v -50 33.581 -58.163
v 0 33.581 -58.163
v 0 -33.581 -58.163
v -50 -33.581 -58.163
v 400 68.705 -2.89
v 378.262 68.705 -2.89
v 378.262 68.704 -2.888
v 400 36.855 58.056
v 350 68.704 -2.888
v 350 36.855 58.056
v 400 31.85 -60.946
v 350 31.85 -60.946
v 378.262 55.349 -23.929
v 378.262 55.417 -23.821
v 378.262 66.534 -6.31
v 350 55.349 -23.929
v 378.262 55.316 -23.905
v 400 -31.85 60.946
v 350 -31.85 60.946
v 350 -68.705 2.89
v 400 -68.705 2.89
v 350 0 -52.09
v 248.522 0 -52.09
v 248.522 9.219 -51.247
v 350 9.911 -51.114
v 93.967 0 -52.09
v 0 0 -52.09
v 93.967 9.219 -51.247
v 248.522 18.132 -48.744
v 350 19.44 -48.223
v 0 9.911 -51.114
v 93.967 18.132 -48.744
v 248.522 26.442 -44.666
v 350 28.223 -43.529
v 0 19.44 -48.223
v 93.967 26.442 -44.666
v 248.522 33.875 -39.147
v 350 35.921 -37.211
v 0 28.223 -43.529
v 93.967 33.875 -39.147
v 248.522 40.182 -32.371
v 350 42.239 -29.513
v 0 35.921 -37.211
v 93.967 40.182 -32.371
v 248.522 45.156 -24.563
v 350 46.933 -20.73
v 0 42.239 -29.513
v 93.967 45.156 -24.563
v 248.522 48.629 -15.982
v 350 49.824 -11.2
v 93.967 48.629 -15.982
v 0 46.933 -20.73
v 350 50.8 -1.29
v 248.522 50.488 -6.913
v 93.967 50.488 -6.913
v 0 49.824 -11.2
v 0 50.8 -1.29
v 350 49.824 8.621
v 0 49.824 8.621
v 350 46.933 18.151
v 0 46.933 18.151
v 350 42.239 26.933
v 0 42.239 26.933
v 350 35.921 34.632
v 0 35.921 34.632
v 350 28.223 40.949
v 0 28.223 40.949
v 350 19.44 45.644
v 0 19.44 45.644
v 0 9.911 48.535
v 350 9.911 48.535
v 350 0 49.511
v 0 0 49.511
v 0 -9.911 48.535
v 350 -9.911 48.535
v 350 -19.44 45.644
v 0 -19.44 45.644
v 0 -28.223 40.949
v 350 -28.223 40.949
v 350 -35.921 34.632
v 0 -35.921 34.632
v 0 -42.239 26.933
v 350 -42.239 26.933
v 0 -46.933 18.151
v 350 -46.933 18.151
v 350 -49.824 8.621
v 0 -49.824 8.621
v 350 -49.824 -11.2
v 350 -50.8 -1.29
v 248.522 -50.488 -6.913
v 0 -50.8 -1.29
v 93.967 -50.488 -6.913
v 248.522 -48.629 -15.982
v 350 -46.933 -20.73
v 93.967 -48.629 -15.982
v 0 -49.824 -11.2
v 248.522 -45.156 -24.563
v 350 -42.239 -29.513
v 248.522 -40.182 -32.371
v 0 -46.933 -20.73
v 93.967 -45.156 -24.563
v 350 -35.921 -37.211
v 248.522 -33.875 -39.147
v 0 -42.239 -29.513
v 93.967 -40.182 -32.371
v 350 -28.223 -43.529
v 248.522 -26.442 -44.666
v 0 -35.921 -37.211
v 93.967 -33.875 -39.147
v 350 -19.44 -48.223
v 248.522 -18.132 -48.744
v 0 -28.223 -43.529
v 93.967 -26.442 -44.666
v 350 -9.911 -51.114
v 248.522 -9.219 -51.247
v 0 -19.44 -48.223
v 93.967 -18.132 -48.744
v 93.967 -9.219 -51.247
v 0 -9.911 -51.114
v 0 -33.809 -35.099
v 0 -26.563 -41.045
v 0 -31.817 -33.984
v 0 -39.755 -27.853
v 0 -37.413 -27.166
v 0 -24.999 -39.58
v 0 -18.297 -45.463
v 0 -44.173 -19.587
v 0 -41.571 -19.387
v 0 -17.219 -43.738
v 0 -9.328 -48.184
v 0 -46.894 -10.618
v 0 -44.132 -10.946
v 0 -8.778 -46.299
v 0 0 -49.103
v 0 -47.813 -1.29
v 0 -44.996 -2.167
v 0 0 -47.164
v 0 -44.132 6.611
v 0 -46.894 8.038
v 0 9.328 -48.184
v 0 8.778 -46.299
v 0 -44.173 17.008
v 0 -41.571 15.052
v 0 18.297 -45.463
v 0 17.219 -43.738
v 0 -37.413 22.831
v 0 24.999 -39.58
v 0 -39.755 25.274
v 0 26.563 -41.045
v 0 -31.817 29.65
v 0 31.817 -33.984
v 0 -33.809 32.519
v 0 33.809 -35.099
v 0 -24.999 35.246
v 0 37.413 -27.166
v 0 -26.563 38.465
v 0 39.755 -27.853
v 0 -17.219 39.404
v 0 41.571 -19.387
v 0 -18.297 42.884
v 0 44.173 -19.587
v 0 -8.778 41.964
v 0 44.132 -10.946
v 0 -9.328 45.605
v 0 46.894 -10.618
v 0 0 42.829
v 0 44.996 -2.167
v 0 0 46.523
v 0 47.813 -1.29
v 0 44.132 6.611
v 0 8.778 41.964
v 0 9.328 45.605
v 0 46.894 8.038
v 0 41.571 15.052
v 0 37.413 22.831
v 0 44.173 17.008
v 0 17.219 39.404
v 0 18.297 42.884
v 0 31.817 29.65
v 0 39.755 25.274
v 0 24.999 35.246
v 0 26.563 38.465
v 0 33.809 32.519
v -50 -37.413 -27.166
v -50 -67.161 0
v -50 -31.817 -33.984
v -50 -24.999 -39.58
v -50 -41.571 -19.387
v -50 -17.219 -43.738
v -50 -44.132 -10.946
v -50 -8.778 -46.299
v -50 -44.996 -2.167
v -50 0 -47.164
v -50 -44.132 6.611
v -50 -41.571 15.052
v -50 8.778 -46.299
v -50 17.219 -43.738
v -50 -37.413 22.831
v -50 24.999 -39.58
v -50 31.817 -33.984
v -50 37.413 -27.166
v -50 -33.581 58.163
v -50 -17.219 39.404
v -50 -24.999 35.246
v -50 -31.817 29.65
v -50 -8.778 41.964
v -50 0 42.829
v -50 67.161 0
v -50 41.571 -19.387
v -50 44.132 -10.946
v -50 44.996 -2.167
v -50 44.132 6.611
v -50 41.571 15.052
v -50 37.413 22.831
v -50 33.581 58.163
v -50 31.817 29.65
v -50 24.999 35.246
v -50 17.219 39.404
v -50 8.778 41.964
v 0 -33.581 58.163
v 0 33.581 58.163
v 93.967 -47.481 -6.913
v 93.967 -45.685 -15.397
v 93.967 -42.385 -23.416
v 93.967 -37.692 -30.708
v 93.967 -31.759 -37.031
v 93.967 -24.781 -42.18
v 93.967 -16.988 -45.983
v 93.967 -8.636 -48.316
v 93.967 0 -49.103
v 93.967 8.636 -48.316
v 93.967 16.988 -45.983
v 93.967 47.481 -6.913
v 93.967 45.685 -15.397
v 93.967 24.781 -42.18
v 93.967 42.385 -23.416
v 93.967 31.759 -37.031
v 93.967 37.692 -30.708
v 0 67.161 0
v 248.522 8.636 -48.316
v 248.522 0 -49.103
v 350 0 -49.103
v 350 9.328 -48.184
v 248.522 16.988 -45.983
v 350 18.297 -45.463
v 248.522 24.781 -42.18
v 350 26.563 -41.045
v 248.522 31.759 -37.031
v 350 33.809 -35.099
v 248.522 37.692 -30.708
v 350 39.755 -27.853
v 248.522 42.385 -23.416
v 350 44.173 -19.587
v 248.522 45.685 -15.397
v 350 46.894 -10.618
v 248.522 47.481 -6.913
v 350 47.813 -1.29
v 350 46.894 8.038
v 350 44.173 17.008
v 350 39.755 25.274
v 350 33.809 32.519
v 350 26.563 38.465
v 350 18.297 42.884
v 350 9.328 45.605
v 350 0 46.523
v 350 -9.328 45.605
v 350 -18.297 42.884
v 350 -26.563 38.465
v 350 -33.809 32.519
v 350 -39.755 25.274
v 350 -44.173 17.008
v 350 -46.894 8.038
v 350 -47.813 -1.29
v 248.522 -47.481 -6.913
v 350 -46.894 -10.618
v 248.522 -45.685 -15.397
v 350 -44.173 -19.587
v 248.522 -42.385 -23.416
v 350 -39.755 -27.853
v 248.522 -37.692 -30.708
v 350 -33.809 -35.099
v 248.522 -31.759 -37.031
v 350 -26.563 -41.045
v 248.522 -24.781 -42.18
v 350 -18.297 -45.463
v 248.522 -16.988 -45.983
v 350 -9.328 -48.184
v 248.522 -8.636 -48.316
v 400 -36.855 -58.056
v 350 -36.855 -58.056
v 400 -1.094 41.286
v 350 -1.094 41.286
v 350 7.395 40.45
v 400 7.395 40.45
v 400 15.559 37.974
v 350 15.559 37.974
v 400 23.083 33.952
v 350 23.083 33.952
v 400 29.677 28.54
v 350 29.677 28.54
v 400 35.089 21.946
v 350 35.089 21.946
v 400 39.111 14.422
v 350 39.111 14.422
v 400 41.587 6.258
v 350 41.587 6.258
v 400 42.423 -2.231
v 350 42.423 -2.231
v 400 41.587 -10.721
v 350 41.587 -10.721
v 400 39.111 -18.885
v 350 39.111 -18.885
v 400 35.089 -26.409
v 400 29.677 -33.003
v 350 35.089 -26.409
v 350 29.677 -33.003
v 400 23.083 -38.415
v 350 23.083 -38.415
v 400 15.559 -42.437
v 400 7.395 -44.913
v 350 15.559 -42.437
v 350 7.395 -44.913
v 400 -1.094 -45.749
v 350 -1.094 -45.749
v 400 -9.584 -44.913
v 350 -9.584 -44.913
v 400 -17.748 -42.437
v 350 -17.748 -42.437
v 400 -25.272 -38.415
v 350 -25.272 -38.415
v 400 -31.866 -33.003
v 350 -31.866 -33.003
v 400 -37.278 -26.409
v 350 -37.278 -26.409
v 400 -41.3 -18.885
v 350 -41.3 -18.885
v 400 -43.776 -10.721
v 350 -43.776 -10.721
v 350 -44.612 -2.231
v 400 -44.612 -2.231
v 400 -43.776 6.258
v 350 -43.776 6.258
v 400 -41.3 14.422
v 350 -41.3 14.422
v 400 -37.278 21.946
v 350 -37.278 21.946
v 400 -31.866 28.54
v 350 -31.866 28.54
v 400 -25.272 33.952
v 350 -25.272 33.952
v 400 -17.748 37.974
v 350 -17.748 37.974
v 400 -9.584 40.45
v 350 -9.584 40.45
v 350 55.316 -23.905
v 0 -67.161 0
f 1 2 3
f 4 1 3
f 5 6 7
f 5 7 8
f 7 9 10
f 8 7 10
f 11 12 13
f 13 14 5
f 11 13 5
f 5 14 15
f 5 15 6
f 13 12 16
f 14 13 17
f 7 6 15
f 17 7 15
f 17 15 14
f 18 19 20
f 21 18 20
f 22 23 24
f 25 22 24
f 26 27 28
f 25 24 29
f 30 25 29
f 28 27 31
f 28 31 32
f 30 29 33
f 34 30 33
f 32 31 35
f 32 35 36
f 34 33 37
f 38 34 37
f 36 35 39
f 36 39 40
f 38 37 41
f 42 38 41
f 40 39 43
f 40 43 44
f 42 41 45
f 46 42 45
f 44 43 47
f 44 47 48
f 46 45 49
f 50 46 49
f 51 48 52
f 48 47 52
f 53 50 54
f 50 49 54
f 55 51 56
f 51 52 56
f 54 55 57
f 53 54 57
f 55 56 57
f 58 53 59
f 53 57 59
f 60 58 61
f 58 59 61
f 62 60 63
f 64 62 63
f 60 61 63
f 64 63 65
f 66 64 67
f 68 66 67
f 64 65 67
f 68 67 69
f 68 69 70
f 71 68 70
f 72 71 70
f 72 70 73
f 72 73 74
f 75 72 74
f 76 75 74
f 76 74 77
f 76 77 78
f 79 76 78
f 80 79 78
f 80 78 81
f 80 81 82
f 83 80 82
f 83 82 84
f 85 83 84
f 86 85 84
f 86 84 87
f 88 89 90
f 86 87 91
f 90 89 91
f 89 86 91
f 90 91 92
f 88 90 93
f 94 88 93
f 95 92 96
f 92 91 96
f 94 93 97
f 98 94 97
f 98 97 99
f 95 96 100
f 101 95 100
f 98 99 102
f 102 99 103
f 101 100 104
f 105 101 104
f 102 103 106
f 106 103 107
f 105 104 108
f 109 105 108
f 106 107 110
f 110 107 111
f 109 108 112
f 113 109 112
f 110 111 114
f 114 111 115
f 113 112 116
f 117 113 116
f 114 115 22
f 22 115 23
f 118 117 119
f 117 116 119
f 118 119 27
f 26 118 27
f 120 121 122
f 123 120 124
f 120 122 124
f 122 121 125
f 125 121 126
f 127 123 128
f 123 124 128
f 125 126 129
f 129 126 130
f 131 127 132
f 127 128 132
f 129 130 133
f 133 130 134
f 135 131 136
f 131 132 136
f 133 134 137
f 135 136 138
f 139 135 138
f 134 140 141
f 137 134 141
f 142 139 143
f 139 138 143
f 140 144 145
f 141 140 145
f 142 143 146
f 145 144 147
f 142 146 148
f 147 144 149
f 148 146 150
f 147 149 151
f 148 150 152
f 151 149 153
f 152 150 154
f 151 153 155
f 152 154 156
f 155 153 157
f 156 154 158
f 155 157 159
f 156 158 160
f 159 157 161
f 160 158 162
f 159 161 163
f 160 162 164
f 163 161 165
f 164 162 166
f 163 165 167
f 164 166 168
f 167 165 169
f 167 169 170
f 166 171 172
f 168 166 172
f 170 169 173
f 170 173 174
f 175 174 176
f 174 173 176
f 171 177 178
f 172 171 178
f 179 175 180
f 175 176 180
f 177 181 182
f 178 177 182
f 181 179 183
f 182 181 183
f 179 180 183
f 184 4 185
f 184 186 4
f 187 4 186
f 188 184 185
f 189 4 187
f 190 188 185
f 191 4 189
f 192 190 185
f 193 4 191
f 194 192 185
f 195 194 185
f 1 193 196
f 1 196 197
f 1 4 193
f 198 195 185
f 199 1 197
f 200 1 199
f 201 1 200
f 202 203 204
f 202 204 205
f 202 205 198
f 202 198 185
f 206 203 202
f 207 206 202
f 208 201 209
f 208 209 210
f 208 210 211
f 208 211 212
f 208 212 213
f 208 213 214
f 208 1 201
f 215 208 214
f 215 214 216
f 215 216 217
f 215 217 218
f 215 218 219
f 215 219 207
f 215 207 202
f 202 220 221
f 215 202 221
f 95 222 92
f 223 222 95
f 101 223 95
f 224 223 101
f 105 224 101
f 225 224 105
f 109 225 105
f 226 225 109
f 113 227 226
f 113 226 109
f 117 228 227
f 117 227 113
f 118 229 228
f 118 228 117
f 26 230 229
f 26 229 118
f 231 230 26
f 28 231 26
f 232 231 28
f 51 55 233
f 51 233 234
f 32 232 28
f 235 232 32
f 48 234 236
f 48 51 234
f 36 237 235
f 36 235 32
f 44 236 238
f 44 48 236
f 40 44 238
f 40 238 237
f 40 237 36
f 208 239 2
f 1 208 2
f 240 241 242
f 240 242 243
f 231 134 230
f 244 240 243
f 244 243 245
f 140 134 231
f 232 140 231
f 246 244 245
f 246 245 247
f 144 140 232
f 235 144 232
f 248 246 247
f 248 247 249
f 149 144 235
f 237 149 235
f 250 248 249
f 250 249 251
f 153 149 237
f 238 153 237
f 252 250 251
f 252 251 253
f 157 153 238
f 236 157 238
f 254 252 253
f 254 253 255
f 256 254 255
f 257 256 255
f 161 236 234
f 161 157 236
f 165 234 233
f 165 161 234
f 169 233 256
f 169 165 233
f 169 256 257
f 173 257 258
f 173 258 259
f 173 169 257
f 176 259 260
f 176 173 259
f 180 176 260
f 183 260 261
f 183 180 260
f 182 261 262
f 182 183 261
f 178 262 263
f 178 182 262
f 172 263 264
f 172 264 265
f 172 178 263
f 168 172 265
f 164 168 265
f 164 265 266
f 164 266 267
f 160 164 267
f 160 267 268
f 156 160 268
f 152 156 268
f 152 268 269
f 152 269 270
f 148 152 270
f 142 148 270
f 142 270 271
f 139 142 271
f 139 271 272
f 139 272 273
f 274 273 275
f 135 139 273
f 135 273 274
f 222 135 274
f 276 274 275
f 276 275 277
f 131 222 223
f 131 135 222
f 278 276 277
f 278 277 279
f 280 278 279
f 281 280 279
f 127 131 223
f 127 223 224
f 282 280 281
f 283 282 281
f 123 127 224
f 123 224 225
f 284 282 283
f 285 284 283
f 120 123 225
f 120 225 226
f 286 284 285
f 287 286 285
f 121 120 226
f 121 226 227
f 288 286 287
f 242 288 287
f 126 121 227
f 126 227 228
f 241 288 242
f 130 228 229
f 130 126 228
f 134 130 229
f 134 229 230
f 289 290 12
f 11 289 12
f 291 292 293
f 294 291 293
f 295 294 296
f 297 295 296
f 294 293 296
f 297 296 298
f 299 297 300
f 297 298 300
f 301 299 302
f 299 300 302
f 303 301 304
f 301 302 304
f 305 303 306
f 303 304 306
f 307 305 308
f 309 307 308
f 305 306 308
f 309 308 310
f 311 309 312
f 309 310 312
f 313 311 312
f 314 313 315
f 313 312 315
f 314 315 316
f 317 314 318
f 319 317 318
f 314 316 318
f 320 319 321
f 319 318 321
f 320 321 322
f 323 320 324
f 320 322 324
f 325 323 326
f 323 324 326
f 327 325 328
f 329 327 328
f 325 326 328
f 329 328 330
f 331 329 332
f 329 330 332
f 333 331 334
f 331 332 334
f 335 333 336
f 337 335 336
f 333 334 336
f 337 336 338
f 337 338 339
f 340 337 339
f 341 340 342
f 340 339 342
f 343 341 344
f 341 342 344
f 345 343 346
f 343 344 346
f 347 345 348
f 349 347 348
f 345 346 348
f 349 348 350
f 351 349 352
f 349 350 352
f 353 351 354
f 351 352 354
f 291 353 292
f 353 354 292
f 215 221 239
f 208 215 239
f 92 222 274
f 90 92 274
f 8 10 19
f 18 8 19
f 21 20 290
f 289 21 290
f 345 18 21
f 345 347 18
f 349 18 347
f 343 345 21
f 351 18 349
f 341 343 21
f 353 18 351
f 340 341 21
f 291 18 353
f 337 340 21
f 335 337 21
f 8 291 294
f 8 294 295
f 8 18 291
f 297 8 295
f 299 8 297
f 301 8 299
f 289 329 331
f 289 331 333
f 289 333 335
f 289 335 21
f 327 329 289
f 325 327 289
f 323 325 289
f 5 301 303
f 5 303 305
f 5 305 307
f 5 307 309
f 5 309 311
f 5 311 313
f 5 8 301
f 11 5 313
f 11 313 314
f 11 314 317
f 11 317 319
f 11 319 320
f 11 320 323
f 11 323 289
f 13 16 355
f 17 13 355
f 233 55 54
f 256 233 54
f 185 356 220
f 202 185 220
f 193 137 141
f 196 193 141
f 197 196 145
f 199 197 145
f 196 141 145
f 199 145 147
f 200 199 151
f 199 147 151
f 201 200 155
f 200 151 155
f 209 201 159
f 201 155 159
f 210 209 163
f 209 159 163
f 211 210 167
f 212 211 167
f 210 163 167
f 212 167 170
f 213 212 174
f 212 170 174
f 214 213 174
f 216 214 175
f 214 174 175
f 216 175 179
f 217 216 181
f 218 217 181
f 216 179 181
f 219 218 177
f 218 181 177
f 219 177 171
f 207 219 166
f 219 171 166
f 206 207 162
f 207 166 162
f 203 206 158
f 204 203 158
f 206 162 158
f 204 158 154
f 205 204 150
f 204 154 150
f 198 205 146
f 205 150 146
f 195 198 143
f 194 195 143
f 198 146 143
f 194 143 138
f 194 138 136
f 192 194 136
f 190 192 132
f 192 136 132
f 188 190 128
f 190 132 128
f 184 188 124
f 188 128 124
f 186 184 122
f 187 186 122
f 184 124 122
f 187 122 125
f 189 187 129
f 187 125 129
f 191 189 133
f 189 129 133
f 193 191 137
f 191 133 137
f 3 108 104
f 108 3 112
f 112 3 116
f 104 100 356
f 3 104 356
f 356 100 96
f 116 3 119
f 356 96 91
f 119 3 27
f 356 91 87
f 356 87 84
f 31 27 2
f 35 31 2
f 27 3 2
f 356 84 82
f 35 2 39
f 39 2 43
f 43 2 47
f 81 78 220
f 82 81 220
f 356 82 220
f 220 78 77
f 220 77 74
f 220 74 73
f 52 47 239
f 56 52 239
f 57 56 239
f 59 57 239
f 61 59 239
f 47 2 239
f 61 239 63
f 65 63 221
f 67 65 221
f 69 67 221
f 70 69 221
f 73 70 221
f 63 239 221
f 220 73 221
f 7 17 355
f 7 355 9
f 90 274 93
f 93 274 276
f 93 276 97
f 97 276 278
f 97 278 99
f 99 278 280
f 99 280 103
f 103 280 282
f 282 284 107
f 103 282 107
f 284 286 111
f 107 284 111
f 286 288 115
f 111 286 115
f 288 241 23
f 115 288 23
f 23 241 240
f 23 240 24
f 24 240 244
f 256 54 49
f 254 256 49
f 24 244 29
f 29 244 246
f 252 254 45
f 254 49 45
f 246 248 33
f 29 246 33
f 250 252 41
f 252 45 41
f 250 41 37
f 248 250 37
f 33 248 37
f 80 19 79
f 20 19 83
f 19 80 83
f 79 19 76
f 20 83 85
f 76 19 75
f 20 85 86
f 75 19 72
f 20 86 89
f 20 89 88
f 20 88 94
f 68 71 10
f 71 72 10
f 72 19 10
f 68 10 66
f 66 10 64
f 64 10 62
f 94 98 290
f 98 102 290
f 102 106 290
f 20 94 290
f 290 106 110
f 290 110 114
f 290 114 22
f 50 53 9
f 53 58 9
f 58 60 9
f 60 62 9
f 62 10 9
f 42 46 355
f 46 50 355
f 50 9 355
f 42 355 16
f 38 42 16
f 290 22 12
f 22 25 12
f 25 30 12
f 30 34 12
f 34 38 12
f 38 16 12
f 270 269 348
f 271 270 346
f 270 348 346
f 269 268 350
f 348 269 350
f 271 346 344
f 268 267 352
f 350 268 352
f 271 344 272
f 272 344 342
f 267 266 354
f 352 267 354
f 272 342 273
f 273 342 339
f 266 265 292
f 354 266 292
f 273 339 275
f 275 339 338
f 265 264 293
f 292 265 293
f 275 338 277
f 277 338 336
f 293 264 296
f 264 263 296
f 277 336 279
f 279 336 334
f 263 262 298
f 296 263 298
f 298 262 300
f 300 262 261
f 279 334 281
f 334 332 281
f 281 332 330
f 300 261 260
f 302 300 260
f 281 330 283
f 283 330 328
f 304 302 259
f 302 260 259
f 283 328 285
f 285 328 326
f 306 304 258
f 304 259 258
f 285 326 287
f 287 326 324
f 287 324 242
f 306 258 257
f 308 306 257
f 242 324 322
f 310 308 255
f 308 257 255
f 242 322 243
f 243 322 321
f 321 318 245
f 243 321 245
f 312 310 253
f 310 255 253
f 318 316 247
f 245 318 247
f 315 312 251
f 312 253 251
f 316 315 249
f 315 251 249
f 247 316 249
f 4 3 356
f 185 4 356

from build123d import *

# Parameters (mm, degrees)
SKETCH1_R            = 50.800375113
SKETCH1_R_2          = 47.812951641
BOSS_EXTRUDE2_DEPTH  = 350
BOSS_EXTRUDE5_DEPTH  = 50
BOSS_EXTRUDE11_DEPTH = 50
SKETCH6_R            = 44.996318031
CUT_EXTRUDE2_DEPTH   = 50
SKETCH7_R            = 43.517898498
CUT_EXTRUDE3_DEPTH   = 50
SKETCH10_W           = 19.115808835
SKETCH10_H           = 20.742352913
BOSS_EXTRUDE12_DEPTH = 50
SKETCH11_W           = 54.364903868
SKETCH11_H           = 26.370020035
CUT_EXTRUDE6_DEPTH   = 50
SKETCH12_W           = 154.555587183
SKETCH12_H           = 189.686795077
CUT_EXTRUDE7_DEPTH   = 434.835259258
CUT_EXTRUDE9_DEPTH   = 50


with BuildPart() as part:
    # Sketch1 → Boss-Extrude2 (new body)
    with BuildSketch(Plane(origin=(0, 0, 0), x_dir=(0, 0, -1), z_dir=(1, 0, 0))):
        with Locations((1.289702318, 0)):
            Circle(SKETCH1_R)
        with Locations((1.289702318, 0)):
            Circle(SKETCH1_R_2, mode=Mode.SUBTRACT)
    extrude(amount=BOSS_EXTRUDE2_DEPTH)

    # Sketch3 → Boss-Extrude5 (add)
    with BuildSketch(Plane(origin=(350, 0, 0), x_dir=(0, 0, -1), z_dir=(1, 0, 0))):
        Polygon((58.055626726, -36.855405481), (60.945530776, 31.849944836), (2.88990405, 68.705350317), (-58.055626726, 36.855405481), (-60.945530776, -31.849944836), (-2.88990405, -68.705350317), align=None)
        Polygon((29.411876605, -18.99044871), (30.315925302, 11.383738416), (4.46313198, 27.353761118), (-22.293710039, 12.949596693), (-23.197758737, -17.424590433), (2.655034585, -33.394613135), align=None, mode=Mode.SUBTRACT)
    extrude(amount=BOSS_EXTRUDE5_DEPTH)

    # Sketch5 → Boss-Extrude11 (add)
    with BuildSketch(Plane.ZY):
        Polygon((0, -67.161353017), (58.163437865, -33.580676508), (58.163437865, 33.580676508), (0, 67.161353017), (-58.163437865, 33.580676508), (-58.163437865, -33.580676508), align=None)
    extrude(amount=BOSS_EXTRUDE11_DEPTH)

    # Sketch6 → Cut-Extrude2 (cut)
    with BuildSketch(Plane(origin=(0, 0, 0), x_dir=(0, 0, -1), z_dir=(1, 0, 0))):
        with Locations((2.167278034, 0)):
            Circle(SKETCH6_R)
    extrude(amount=-CUT_EXTRUDE2_DEPTH, mode=Mode.SUBTRACT)

    # Sketch7 → Cut-Extrude3 (cut)
    with BuildSketch(Plane.ZY.offset(-350)):
        with Locations((-2.231478452, -1.09442532)):
            Circle(SKETCH7_R)
    extrude(amount=-CUT_EXTRUDE3_DEPTH, mode=Mode.SUBTRACT)

    # Sketch10 → Boss-Extrude12 (add)
    with BuildSketch(Plane(origin=(0, 50.277647577, -31.917717413), x_dir=(1, 0, 0), z_dir=(0, 0.8442477544511112, -0.5359531034561291))):
        with Locations((368.704344308, -19.961055073)):
            Rectangle(SKETCH10_W, SKETCH10_H)
    extrude(amount=BOSS_EXTRUDE12_DEPTH)

    # Sketch11 → Cut-Extrude6 (cut)
    with BuildSketch(Plane(origin=(378.262248725, 0, 0), x_dir=(0, 0, -1), z_dir=(1, 0, 0))):
        with Locations((35.769872333, 101.000183765)):
            Rectangle(SKETCH11_W, SKETCH11_H)
    extrude(amount=-CUT_EXTRUDE6_DEPTH, mode=Mode.SUBTRACT)

    # Sketch12 → Cut-Extrude7 (cut, through all)
    with BuildSketch(Plane(origin=(0, 87.815173747, 0), x_dir=(1, 0, 0), z_dir=(0, 1, 0))):
        with Locations((171.244586456, 101.756488253)):
            Rectangle(SKETCH12_W, SKETCH12_H)
    extrude(amount=-CUT_EXTRUDE7_DEPTH, mode=Mode.SUBTRACT)

    # Sketch13 → Cut-Extrude9 (cut)
    with BuildSketch(Plane(origin=(378.262248725, 0, 0), x_dir=(0, 0, -1), z_dir=(1, 0, 0))):
        Polygon((2.767415971, 94.353770173), (53.126909072, 94.353770173), (23.904702859, 55.316039855), (1.784436984, 69.406798444), align=None)
    extrude(amount=-CUT_EXTRUDE9_DEPTH, mode=Mode.SUBTRACT)


solid = part.part
